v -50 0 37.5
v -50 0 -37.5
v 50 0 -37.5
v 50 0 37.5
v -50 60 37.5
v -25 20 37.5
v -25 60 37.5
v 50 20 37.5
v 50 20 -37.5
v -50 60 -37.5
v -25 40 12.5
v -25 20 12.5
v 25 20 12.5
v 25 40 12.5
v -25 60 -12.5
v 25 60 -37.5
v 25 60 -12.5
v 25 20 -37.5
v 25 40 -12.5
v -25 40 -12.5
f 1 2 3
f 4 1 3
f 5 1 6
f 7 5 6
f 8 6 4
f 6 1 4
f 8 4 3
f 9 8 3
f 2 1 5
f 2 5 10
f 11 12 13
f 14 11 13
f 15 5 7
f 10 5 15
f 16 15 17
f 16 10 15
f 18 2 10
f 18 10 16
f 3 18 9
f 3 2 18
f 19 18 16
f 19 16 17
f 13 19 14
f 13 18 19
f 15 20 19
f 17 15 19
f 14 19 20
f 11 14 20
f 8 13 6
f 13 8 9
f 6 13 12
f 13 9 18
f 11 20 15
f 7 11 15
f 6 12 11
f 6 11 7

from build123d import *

# Parameters (mm, degrees)
SKETCH1_W               = 100
SKETCH1_H               = 75
BOSS_EXTRUDE1_DEPTH     = 60
CUT_EXTRUDE1_DEPTH      = 87.638617256
CUT_EXTRUDE1_DEPTH_BACK = 40
CUT_EXTRUDE2_DEPTH      = 87.638617256
CUT_EXTRUDE2_DEPTH_BACK = 20


with BuildPart() as part:
    # Sketch1 → Boss-Extrude1 (new body)
    with BuildSketch(Plane(origin=(0, 0, 0), x_dir=(1, 0, 0), z_dir=(0, 1, 0))):
        Rectangle(SKETCH1_W, SKETCH1_H)
    extrude(amount=BOSS_EXTRUDE1_DEPTH)

    # Sketch2 → Cut-Extrude1 (cut, two sides: drawn at the far end of the back side and taken through both)
    with BuildSketch(Plane(origin=(0, 60, 0), x_dir=(1, 0, 0), z_dir=(0, 1, 0)).offset(-CUT_EXTRUDE1_DEPTH_BACK)):
        Polygon((-25, -259.632034356), (-25, -37.5), (-25, -12.5), (25, -12.5), (25, 37.5), (25, 259.632034356), (467.218719806, 217.050740324), (417.218719806, -302.213328388), align=None)
    extrude(amount=CUT_EXTRUDE1_DEPTH + CUT_EXTRUDE1_DEPTH_BACK, mode=Mode.SUBTRACT)

    # Sketch3 → Cut-Extrude2 (cut, two sides: drawn at the far end of the back side and taken through both)
    with BuildSketch(Plane(origin=(0, 60, 0), x_dir=(1, 0, 0), z_dir=(0, 1, 0)).offset(-CUT_EXTRUDE2_DEPTH_BACK)):
        Polygon((-25, -234.632034356), (-25, -12.5), (-25, 12.5), (25, 12.5), (25, 37.5), (25, 259.632034356), (467.008191751, 214.918264963), (417.008191751, -279.345803749), align=None)
    extrude(amount=CUT_EXTRUDE2_DEPTH + CUT_EXTRUDE2_DEPTH_BACK, mode=Mode.SUBTRACT)


solid = part.part
